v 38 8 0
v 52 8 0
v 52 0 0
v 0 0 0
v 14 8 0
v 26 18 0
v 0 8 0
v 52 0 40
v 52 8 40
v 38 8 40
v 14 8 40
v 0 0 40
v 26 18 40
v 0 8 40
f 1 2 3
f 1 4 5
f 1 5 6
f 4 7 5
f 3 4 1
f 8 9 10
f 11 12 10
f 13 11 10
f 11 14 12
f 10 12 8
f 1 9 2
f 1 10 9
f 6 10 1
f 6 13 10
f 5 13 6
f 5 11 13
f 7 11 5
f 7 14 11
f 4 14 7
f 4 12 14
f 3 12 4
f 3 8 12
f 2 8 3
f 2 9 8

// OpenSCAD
$fn = 32;

// ----------------------------------------------------------------------
// V guide rail: vrib, 52 mm wide
// ----------------------------------------------------------------------

// --- parameters (mm) ---
rail_w = 52;              // rail width, X
base_t = 8;               // base plate thickness
v_depth = 10;             // V feature depth / height
v_half_w = 12;            // half width of the V at the base face
plate_t = 40;             // rail length, Z (the extrusion height)

profile = [[0, 0], [52, 0], [52, 8], [38, 8], [26, 18], [14, 8], [0, 8]];  // primary outline, 7 points, counter clockwise

// --- the one profile operation ---
linear_extrude(height = plate_t) polygon(points = profile);
